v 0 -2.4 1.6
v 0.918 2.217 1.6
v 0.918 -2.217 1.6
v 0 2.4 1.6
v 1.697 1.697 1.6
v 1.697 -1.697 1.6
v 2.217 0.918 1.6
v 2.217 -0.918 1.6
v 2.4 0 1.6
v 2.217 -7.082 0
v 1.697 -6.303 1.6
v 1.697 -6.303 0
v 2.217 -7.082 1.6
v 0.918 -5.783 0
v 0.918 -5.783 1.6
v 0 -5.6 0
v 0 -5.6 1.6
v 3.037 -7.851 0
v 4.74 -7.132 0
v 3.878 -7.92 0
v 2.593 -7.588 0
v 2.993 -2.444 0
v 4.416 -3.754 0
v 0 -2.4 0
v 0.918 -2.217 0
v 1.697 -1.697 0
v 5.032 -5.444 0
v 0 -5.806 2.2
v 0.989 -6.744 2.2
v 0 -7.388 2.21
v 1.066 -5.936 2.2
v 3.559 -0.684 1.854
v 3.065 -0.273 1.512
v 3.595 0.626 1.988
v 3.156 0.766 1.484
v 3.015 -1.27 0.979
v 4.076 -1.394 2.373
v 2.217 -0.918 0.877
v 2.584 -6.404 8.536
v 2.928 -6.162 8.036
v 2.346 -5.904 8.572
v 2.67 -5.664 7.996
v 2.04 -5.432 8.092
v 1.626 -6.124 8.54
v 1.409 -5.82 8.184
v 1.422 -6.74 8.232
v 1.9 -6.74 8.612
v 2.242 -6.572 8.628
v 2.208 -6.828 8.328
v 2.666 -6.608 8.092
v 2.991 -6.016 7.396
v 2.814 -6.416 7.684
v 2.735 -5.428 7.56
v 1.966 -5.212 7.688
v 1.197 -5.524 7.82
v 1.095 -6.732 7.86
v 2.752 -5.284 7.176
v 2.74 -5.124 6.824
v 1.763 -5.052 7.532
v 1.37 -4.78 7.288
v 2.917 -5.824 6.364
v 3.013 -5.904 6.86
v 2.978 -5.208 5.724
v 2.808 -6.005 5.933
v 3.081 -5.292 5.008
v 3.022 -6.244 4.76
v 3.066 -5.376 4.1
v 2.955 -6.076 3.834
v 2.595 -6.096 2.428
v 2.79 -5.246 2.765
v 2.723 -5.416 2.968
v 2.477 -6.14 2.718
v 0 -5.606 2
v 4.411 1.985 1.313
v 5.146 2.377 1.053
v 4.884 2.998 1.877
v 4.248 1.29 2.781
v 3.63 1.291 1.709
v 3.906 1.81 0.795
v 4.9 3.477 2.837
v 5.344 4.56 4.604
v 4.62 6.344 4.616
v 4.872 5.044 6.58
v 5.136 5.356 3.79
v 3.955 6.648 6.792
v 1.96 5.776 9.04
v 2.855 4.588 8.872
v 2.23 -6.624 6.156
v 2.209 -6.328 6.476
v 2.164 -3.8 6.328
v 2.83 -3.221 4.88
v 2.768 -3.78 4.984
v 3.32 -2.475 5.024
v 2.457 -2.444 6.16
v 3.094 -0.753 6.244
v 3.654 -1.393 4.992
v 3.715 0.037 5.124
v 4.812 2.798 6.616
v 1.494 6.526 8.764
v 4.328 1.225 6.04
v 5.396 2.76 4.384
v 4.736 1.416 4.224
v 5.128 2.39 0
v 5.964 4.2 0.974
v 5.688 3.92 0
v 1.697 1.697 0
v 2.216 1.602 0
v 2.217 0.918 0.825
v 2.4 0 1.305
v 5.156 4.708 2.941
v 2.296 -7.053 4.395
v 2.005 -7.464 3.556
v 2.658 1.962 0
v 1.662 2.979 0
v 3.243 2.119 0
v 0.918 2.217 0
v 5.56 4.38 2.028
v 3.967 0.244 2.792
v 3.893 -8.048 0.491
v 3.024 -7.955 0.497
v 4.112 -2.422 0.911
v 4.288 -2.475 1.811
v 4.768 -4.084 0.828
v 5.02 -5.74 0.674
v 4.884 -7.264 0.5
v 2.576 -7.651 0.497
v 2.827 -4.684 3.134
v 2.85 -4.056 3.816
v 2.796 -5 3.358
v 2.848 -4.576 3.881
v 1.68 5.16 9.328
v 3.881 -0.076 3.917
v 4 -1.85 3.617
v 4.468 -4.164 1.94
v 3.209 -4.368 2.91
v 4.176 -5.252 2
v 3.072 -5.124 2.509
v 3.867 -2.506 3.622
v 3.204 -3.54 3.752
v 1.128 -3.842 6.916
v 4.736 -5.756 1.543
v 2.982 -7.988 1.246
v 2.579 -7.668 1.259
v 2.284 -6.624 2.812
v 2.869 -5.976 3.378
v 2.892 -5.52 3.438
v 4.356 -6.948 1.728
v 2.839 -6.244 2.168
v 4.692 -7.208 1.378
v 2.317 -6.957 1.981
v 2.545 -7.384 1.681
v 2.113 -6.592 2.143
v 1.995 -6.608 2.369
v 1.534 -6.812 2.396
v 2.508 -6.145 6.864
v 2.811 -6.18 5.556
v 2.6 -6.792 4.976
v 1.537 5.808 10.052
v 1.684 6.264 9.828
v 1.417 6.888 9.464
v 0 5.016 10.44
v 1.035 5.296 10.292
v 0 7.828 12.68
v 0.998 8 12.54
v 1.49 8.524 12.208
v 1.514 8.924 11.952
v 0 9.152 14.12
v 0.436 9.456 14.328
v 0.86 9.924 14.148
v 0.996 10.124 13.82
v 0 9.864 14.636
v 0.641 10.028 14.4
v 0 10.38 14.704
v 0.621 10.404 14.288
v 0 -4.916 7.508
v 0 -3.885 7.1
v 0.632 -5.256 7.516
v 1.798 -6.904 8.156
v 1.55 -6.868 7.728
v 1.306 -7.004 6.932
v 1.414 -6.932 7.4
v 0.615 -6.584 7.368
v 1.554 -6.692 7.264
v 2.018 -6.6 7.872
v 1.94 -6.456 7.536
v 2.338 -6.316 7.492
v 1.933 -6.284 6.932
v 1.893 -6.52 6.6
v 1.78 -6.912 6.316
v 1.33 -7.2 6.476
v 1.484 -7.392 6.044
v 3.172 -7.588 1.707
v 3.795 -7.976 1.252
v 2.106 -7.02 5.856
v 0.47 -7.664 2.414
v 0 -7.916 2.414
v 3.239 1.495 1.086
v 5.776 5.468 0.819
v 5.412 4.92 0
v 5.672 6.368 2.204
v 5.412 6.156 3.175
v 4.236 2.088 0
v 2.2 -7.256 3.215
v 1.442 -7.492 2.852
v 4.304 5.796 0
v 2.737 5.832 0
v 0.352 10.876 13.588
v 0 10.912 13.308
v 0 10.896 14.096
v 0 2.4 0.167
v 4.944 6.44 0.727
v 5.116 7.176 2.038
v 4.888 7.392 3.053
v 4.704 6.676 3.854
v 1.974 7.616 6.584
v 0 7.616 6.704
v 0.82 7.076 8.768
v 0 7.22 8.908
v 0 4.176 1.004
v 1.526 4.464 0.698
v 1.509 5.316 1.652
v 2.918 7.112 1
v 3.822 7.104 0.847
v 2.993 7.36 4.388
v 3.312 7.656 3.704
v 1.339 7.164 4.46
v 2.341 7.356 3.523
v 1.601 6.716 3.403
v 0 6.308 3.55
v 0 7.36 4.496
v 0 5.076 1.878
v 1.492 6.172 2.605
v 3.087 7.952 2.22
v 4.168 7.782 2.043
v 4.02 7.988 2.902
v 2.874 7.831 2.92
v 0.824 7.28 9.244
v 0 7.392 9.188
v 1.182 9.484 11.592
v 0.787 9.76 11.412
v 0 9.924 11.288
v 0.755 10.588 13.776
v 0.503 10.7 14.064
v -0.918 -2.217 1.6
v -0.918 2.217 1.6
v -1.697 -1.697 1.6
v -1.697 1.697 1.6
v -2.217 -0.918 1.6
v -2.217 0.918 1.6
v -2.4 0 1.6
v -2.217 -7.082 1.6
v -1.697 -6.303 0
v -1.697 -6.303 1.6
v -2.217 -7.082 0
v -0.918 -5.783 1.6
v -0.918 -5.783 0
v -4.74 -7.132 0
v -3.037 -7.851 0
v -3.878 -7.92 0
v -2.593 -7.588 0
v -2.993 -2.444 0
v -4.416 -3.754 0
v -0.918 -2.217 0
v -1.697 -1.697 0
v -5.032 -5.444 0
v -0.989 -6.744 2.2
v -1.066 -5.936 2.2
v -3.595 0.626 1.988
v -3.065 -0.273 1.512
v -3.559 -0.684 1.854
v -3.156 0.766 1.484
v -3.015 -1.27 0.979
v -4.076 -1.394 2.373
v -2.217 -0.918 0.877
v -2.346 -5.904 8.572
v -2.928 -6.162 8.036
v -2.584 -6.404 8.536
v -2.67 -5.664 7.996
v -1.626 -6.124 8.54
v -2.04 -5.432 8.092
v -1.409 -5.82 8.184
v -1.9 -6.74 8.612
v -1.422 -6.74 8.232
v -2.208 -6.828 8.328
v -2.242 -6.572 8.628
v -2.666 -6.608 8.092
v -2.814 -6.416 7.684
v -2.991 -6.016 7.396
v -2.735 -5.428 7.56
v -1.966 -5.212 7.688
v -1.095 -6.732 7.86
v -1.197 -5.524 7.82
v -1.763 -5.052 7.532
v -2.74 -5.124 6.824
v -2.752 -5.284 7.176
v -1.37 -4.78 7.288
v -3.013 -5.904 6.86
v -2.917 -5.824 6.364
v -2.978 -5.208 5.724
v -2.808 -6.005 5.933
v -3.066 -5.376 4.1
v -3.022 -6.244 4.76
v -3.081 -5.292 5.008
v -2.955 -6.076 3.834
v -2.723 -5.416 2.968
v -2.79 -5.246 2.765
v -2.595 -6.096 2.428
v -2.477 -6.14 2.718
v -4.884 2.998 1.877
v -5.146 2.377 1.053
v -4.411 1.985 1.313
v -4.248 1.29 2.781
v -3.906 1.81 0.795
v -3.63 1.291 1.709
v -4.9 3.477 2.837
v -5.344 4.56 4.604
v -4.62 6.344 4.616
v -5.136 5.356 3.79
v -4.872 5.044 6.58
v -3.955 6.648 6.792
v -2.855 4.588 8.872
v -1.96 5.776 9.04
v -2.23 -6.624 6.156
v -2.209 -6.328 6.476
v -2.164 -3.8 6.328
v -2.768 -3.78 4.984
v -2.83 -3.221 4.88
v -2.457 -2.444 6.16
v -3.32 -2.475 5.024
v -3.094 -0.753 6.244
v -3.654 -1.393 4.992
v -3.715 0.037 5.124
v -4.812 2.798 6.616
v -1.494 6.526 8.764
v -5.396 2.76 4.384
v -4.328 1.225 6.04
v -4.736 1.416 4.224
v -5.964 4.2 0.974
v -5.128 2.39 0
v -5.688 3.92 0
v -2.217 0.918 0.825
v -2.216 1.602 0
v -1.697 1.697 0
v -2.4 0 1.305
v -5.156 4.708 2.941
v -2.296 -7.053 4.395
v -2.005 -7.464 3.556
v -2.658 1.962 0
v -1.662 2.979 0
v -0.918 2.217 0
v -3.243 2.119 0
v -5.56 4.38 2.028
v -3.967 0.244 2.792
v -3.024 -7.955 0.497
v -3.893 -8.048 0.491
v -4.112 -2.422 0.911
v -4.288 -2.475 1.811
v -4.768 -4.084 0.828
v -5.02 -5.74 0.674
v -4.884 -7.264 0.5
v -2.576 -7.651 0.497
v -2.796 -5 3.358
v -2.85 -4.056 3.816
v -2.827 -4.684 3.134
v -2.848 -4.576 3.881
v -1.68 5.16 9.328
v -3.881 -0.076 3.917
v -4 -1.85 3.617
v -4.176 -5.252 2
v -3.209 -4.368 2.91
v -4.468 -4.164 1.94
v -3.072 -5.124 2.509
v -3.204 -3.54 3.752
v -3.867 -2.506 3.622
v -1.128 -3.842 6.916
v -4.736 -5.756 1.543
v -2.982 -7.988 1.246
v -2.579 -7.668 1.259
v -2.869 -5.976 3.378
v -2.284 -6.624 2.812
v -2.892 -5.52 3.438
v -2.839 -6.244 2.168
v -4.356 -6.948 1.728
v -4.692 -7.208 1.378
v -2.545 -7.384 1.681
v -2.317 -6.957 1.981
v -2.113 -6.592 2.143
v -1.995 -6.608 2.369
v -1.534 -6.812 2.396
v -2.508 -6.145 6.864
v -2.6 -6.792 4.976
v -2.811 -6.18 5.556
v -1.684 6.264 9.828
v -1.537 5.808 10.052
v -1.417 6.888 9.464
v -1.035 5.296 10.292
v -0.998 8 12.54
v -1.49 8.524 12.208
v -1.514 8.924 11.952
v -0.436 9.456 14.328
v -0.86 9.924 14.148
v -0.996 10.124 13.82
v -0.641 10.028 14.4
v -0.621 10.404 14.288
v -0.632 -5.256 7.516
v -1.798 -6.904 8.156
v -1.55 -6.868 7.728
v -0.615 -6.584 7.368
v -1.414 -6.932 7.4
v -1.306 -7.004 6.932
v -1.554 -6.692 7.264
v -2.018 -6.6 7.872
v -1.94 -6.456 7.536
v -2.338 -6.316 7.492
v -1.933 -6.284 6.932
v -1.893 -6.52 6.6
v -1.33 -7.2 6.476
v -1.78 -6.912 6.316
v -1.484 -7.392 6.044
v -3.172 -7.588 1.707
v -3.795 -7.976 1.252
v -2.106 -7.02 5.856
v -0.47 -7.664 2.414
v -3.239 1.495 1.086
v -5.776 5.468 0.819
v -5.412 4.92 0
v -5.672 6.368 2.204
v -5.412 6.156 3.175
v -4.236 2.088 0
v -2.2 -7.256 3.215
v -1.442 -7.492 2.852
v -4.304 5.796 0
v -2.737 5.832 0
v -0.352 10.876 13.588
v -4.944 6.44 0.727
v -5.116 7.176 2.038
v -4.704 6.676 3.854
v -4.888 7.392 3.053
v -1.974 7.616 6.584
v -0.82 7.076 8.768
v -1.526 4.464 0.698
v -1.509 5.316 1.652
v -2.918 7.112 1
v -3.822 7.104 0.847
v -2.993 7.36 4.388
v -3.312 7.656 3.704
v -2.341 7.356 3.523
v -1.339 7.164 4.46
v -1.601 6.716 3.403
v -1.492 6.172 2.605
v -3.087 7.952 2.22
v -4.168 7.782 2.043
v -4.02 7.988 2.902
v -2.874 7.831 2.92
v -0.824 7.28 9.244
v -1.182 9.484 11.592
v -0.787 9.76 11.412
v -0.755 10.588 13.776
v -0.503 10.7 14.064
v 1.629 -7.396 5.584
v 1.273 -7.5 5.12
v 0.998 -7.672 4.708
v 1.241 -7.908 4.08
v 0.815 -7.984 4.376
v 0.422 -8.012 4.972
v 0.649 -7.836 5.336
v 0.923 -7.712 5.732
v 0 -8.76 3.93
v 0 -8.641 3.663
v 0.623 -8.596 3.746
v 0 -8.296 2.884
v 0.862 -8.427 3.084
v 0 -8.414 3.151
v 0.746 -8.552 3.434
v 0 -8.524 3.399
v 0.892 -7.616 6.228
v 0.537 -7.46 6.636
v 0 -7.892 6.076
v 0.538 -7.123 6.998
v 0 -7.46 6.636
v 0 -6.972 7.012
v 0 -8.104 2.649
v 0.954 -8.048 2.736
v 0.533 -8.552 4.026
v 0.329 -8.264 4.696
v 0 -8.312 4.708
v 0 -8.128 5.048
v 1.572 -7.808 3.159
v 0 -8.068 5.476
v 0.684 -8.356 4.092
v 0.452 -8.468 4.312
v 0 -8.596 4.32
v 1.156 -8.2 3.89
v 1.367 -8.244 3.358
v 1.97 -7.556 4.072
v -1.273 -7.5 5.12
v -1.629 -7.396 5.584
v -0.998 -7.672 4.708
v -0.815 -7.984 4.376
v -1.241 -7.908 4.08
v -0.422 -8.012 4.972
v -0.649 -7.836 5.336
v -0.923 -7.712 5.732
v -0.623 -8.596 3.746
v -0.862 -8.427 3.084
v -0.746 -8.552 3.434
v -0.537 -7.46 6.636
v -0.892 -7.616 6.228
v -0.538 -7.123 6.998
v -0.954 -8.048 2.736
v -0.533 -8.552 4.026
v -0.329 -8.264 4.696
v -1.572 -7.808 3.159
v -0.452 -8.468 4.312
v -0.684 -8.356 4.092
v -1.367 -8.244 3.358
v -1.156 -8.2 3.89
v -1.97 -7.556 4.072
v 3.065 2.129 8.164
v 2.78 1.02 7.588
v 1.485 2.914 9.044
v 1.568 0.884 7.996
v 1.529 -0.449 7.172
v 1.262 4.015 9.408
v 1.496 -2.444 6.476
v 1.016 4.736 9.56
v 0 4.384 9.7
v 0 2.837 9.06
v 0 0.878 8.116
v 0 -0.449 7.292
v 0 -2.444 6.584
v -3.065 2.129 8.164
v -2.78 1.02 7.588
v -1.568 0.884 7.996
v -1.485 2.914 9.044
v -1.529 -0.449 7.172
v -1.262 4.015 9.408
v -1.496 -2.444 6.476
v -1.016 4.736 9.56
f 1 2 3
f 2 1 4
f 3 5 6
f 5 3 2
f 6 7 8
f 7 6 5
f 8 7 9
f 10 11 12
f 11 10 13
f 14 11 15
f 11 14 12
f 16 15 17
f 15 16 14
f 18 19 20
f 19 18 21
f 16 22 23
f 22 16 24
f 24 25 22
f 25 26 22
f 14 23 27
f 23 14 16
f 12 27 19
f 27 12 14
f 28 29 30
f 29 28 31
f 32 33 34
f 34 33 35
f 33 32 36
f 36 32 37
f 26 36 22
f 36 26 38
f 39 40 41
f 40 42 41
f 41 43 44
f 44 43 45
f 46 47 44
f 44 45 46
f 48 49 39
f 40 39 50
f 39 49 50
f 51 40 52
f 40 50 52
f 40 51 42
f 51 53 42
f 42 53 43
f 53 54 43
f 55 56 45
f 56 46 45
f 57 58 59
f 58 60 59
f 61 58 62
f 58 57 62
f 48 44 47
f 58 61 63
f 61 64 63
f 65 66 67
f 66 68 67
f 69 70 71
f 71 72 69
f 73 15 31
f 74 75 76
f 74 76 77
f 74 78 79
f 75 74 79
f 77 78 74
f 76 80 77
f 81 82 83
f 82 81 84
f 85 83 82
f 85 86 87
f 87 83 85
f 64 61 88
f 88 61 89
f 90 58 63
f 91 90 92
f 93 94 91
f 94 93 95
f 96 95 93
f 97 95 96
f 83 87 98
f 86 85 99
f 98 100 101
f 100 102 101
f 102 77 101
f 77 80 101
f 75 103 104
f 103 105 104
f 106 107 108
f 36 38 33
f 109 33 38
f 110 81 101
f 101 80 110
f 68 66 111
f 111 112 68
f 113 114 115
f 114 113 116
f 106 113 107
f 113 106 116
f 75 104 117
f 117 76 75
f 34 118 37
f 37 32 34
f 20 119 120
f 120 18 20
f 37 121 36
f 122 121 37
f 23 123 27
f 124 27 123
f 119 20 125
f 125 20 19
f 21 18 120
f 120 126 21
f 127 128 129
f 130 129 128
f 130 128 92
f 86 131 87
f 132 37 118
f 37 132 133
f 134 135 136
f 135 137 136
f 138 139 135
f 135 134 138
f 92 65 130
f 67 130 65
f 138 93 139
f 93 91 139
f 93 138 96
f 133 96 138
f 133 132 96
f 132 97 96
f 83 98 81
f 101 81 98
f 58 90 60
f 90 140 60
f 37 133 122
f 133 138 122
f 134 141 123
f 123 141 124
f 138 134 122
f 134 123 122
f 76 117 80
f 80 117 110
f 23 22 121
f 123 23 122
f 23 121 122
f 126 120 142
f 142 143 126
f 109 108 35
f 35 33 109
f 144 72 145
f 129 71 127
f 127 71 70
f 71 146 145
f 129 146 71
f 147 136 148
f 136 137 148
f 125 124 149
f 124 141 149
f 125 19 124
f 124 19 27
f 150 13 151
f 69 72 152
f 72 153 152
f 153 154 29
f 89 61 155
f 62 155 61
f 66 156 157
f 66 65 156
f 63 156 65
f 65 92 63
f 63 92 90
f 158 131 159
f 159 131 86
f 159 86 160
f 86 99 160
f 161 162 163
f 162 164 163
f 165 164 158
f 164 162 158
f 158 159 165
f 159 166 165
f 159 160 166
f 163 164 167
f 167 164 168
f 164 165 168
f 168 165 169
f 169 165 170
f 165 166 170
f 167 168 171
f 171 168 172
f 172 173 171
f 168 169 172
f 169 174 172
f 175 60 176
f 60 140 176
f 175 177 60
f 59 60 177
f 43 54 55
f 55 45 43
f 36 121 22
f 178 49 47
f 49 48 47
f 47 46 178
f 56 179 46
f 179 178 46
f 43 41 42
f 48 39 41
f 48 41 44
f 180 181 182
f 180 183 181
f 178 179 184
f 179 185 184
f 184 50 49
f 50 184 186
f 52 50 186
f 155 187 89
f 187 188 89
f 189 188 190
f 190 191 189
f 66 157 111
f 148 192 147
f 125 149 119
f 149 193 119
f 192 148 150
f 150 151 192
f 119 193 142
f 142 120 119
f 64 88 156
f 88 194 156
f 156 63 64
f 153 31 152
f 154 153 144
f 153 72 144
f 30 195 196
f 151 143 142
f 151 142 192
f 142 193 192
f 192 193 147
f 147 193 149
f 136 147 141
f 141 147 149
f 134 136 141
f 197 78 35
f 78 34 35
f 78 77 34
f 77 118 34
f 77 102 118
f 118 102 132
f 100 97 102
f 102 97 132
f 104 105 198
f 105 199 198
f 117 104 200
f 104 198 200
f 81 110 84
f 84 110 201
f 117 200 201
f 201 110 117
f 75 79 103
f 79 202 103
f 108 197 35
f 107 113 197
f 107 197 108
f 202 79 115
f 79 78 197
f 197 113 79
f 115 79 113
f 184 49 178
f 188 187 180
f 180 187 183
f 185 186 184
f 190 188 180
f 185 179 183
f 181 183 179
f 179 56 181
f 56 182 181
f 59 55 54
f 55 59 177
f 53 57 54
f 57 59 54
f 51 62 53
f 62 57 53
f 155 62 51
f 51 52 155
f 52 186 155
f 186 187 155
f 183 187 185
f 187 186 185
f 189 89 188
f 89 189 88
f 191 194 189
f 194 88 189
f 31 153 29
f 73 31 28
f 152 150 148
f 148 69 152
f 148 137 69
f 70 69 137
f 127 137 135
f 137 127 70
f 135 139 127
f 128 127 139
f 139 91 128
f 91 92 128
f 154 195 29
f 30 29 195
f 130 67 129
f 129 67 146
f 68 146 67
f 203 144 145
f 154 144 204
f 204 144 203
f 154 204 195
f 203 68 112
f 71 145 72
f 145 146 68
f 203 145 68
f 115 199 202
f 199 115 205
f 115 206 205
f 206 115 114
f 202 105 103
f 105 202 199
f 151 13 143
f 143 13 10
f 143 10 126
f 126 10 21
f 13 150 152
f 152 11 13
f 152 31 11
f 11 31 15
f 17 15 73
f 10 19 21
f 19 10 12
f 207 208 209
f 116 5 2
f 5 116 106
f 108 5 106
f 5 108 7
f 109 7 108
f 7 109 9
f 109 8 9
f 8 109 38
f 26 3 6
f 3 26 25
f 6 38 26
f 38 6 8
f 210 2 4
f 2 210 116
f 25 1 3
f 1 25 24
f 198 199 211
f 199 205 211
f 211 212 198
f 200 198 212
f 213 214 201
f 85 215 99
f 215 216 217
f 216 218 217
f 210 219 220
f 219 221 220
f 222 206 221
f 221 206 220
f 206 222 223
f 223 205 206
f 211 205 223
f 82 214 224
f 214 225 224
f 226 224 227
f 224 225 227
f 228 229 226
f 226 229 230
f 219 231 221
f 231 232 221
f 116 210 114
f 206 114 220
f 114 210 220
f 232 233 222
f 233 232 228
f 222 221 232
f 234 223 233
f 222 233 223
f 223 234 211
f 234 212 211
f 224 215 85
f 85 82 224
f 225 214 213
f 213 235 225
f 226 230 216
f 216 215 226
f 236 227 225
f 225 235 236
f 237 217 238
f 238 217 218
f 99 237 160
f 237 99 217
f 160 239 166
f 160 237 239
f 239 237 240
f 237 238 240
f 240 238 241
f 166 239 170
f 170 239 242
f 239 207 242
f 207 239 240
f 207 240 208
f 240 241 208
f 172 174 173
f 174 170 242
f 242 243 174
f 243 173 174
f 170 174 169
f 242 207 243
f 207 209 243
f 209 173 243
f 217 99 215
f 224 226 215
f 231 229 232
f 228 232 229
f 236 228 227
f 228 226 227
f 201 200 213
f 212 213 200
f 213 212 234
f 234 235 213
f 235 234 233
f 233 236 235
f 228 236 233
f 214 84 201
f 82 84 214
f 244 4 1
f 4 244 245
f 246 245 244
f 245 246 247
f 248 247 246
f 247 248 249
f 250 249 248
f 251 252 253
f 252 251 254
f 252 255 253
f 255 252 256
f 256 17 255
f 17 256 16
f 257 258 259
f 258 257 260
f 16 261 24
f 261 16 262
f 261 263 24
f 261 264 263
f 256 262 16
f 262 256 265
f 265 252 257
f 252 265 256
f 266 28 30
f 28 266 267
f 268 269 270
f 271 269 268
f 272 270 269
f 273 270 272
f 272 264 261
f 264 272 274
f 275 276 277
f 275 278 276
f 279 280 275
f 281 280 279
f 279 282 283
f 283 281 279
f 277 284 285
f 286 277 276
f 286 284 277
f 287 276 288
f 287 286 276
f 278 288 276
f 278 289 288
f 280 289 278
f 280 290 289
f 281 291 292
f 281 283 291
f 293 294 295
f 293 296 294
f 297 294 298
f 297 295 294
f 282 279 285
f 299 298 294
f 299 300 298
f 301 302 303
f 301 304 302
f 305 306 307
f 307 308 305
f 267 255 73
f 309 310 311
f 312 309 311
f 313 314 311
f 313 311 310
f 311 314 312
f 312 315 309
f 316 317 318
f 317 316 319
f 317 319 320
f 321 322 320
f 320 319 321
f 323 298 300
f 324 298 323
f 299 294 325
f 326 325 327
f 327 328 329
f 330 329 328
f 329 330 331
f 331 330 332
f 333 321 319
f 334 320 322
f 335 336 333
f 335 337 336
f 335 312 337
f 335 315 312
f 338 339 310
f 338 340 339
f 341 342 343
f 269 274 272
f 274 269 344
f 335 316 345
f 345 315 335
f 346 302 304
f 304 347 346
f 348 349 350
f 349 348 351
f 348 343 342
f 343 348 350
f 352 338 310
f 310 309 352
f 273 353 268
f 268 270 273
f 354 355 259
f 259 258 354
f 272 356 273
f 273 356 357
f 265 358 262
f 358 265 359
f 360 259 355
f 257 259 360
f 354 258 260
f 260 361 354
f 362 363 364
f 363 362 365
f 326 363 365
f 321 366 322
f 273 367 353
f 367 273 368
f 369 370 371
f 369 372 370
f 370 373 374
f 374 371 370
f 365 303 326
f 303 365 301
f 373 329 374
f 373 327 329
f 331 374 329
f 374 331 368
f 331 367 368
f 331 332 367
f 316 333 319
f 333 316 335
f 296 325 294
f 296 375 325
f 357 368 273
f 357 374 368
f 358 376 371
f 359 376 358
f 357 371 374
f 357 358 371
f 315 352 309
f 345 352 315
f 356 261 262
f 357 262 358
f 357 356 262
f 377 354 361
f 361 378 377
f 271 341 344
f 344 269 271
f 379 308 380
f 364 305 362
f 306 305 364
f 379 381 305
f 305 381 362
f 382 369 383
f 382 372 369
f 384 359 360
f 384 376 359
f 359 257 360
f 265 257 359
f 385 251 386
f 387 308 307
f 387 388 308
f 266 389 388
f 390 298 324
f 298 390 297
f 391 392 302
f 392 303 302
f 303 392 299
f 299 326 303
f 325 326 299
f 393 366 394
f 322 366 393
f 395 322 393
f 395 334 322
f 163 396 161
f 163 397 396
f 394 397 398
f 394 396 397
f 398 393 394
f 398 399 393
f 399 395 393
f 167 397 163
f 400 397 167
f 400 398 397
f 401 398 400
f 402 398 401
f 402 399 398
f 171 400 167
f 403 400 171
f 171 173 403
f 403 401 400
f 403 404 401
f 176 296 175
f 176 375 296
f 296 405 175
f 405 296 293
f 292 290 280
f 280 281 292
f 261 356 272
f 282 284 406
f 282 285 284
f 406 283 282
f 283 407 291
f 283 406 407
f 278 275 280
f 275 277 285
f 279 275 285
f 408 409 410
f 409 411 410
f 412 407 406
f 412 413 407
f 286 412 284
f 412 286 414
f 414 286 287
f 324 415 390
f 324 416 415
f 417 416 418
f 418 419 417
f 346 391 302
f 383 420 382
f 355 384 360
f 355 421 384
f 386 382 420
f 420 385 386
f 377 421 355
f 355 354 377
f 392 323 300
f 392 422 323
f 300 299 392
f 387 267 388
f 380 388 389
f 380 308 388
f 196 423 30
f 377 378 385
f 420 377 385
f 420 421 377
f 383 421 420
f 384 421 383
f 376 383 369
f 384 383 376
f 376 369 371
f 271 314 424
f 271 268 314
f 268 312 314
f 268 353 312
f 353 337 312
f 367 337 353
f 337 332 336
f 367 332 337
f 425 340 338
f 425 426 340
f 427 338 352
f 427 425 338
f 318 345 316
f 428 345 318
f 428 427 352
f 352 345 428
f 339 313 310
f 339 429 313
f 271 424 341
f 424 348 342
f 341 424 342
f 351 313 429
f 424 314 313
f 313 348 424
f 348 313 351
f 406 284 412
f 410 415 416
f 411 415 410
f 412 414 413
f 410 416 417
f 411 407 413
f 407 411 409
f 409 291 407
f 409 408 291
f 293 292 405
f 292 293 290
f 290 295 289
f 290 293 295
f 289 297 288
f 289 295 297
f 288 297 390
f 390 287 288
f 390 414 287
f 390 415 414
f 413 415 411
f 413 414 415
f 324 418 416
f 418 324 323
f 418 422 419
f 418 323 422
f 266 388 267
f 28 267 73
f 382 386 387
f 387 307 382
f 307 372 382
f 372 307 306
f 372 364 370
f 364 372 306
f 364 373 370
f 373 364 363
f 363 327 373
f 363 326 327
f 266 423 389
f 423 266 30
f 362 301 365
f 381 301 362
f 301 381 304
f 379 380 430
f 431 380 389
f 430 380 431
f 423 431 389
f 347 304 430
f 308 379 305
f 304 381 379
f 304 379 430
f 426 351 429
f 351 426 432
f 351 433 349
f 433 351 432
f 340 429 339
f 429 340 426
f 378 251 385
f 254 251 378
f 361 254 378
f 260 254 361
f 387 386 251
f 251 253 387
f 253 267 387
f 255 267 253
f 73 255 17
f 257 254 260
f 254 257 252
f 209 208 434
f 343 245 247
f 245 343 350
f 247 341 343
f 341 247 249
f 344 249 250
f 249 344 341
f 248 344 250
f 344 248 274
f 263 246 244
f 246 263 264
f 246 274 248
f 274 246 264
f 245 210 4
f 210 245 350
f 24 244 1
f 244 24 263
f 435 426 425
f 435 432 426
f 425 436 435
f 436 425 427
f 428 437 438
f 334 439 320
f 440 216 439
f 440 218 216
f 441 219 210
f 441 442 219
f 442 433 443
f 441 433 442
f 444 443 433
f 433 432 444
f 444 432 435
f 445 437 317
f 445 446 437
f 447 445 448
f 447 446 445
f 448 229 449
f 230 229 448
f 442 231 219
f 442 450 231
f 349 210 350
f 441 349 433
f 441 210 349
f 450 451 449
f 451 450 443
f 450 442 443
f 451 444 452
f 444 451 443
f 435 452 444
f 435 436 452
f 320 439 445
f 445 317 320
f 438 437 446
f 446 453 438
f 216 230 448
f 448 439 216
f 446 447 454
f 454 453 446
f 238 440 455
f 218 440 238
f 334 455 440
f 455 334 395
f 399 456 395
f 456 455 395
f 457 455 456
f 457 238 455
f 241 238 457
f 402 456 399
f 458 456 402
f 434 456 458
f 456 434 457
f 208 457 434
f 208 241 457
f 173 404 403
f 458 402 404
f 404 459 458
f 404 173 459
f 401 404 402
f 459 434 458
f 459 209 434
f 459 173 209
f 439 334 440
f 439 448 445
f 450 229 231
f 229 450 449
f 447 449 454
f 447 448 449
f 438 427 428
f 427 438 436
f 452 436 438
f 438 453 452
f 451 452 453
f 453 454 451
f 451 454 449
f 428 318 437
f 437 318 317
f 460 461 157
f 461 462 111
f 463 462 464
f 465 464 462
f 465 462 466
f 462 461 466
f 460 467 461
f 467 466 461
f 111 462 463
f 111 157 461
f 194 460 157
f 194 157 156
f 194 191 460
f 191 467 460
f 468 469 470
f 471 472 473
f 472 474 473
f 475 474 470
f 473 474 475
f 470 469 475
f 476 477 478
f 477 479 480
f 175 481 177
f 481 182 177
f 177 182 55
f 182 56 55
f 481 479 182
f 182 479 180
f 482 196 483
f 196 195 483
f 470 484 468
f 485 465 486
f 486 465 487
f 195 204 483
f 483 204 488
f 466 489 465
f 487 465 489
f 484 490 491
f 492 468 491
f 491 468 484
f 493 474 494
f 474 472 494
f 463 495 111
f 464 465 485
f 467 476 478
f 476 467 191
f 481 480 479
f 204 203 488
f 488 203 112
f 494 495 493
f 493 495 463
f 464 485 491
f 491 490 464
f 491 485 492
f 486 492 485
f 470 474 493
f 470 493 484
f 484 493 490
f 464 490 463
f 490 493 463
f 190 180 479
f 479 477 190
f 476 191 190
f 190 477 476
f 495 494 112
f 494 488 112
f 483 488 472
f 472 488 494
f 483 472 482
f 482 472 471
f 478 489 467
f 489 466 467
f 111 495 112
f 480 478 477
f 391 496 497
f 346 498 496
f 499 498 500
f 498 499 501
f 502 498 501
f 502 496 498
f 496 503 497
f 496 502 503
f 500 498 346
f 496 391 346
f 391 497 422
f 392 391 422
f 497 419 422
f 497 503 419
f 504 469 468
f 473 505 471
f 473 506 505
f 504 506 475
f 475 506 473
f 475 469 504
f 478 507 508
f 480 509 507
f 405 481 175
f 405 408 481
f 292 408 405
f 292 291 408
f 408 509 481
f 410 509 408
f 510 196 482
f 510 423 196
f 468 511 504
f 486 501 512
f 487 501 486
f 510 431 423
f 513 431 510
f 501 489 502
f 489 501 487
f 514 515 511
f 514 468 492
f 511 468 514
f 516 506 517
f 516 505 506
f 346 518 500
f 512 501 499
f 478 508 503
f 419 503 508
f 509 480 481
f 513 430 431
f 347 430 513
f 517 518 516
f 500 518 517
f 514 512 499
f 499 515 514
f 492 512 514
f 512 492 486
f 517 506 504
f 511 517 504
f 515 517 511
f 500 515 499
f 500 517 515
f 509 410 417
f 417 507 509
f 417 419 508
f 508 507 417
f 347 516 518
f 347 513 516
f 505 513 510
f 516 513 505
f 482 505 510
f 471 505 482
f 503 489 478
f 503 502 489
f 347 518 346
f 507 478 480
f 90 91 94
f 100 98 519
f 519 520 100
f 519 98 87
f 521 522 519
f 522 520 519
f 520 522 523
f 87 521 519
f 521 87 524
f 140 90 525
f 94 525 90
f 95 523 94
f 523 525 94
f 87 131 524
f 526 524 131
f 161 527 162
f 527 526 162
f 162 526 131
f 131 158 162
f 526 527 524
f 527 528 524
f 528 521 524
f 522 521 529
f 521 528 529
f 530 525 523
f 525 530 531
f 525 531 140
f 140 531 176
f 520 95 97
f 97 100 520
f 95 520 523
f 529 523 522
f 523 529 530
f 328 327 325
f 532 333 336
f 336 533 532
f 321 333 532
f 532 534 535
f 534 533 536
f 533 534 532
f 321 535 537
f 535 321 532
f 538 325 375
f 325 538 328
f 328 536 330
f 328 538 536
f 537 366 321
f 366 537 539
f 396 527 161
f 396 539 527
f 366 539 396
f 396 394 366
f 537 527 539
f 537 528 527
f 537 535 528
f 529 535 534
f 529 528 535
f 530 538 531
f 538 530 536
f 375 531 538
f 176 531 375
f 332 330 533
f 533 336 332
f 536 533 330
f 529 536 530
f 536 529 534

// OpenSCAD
use <../lib.scad>
use <s/6251s01.scad>
use <s/6251s02.scad>
use <s/6251s03.scad>
function ldraw_lib__6251() = [
// 0 Animal Cat Crouching
// 0 Name: 6251.dat
// 0 Author: Willy Tschager [Holly-Wood]
// 0 !LDRAW_ORG Part UPDATE 2022-06
// 0 !LICENSE Licensed under CC BY 4.0 : see CAreadme.txt
// 
// 0 BFC CERTIFY CW
  [0,"BFC","CERTIFY"],
  [0,"BFC","CW"],
// 
// 0 !KEYWORDS creature, mousetrap, pet, Set 5571, set 5871, set 7673
// 
// 0 !HISTORY 2004-04-20 [Holly-Wood] fixed stud, made BFC compliant, re-grouped, added keywords and category
// 0 !HISTORY 2004-11-06 [PTadmin] Official Update 2004-04
// 0 !HISTORY 2007-10-12 [PTadmin] Header formatted for Contributor Agreement
// 0 !HISTORY 2008-07-01 [PTadmin] Official Update 2008-01
// 0 !HISTORY 2022-03-06 [PTadmin] Official Update 2022-02
// 0 !HISTORY 2022-03-07 {LEGO Universe Team} Original part shape
// 0 !HISTORY 2022-03-08 [Holly-Wood] Complete rewrite from LUT data
// 0 !HISTORY 2022-12-20 [PTadmin] Official Update 2022-06
// 
// 
// 0 // Half without Patternable Area
// 
// 1 16 0 0 0 1 0 0 0 1 0 0 0 1 s\6251s01.dat
  [1,16,0,0,0,1,0,0,0,1,0,0,0,1, ldraw_lib__s__6251s01()],
// 1 16 0 0 0 -1 0 0 0 1 0 0 0 1 s\6251s01.dat
  [1,16,0,0,0,-1,0,0,0,1,0,0,0,1, ldraw_lib__s__6251s01()],
// 
// 0 // Patternable Area Face
// 1 16 0 0 0 1 0 0 0 1 0 0 0 1 s\6251s02.dat
  [1,16,0,0,0,1,0,0,0,1,0,0,0,1, ldraw_lib__s__6251s02()],
// 1 16 0 0 0 -1 0 0 0 1 0 0 0 1 s\6251s02.dat
  [1,16,0,0,0,-1,0,0,0,1,0,0,0,1, ldraw_lib__s__6251s02()],
// 
// 0 // Patternable Area Back
// 1 16 0 0 0 1 0 0 0 1 0 0 0 1 s\6251s03.dat
  [1,16,0,0,0,1,0,0,0,1,0,0,0,1, ldraw_lib__s__6251s03()],
// 1 16 0 0 0 -1 0 0 0 1 0 0 0 1 s\6251s03.dat
  [1,16,0,0,0,-1,0,0,0,1,0,0,0,1, ldraw_lib__s__6251s03()],
];
module ldraw_lib__6251(step=0, col=false, unit=2/5, alt=false, line=0.2, solid=!$preview)
    makepoly(ldraw_lib__6251(), step=step, col=col, unit=unit, alt=alt, line=line, solid=solid);
ldraw_lib__6251(line=0.2);
